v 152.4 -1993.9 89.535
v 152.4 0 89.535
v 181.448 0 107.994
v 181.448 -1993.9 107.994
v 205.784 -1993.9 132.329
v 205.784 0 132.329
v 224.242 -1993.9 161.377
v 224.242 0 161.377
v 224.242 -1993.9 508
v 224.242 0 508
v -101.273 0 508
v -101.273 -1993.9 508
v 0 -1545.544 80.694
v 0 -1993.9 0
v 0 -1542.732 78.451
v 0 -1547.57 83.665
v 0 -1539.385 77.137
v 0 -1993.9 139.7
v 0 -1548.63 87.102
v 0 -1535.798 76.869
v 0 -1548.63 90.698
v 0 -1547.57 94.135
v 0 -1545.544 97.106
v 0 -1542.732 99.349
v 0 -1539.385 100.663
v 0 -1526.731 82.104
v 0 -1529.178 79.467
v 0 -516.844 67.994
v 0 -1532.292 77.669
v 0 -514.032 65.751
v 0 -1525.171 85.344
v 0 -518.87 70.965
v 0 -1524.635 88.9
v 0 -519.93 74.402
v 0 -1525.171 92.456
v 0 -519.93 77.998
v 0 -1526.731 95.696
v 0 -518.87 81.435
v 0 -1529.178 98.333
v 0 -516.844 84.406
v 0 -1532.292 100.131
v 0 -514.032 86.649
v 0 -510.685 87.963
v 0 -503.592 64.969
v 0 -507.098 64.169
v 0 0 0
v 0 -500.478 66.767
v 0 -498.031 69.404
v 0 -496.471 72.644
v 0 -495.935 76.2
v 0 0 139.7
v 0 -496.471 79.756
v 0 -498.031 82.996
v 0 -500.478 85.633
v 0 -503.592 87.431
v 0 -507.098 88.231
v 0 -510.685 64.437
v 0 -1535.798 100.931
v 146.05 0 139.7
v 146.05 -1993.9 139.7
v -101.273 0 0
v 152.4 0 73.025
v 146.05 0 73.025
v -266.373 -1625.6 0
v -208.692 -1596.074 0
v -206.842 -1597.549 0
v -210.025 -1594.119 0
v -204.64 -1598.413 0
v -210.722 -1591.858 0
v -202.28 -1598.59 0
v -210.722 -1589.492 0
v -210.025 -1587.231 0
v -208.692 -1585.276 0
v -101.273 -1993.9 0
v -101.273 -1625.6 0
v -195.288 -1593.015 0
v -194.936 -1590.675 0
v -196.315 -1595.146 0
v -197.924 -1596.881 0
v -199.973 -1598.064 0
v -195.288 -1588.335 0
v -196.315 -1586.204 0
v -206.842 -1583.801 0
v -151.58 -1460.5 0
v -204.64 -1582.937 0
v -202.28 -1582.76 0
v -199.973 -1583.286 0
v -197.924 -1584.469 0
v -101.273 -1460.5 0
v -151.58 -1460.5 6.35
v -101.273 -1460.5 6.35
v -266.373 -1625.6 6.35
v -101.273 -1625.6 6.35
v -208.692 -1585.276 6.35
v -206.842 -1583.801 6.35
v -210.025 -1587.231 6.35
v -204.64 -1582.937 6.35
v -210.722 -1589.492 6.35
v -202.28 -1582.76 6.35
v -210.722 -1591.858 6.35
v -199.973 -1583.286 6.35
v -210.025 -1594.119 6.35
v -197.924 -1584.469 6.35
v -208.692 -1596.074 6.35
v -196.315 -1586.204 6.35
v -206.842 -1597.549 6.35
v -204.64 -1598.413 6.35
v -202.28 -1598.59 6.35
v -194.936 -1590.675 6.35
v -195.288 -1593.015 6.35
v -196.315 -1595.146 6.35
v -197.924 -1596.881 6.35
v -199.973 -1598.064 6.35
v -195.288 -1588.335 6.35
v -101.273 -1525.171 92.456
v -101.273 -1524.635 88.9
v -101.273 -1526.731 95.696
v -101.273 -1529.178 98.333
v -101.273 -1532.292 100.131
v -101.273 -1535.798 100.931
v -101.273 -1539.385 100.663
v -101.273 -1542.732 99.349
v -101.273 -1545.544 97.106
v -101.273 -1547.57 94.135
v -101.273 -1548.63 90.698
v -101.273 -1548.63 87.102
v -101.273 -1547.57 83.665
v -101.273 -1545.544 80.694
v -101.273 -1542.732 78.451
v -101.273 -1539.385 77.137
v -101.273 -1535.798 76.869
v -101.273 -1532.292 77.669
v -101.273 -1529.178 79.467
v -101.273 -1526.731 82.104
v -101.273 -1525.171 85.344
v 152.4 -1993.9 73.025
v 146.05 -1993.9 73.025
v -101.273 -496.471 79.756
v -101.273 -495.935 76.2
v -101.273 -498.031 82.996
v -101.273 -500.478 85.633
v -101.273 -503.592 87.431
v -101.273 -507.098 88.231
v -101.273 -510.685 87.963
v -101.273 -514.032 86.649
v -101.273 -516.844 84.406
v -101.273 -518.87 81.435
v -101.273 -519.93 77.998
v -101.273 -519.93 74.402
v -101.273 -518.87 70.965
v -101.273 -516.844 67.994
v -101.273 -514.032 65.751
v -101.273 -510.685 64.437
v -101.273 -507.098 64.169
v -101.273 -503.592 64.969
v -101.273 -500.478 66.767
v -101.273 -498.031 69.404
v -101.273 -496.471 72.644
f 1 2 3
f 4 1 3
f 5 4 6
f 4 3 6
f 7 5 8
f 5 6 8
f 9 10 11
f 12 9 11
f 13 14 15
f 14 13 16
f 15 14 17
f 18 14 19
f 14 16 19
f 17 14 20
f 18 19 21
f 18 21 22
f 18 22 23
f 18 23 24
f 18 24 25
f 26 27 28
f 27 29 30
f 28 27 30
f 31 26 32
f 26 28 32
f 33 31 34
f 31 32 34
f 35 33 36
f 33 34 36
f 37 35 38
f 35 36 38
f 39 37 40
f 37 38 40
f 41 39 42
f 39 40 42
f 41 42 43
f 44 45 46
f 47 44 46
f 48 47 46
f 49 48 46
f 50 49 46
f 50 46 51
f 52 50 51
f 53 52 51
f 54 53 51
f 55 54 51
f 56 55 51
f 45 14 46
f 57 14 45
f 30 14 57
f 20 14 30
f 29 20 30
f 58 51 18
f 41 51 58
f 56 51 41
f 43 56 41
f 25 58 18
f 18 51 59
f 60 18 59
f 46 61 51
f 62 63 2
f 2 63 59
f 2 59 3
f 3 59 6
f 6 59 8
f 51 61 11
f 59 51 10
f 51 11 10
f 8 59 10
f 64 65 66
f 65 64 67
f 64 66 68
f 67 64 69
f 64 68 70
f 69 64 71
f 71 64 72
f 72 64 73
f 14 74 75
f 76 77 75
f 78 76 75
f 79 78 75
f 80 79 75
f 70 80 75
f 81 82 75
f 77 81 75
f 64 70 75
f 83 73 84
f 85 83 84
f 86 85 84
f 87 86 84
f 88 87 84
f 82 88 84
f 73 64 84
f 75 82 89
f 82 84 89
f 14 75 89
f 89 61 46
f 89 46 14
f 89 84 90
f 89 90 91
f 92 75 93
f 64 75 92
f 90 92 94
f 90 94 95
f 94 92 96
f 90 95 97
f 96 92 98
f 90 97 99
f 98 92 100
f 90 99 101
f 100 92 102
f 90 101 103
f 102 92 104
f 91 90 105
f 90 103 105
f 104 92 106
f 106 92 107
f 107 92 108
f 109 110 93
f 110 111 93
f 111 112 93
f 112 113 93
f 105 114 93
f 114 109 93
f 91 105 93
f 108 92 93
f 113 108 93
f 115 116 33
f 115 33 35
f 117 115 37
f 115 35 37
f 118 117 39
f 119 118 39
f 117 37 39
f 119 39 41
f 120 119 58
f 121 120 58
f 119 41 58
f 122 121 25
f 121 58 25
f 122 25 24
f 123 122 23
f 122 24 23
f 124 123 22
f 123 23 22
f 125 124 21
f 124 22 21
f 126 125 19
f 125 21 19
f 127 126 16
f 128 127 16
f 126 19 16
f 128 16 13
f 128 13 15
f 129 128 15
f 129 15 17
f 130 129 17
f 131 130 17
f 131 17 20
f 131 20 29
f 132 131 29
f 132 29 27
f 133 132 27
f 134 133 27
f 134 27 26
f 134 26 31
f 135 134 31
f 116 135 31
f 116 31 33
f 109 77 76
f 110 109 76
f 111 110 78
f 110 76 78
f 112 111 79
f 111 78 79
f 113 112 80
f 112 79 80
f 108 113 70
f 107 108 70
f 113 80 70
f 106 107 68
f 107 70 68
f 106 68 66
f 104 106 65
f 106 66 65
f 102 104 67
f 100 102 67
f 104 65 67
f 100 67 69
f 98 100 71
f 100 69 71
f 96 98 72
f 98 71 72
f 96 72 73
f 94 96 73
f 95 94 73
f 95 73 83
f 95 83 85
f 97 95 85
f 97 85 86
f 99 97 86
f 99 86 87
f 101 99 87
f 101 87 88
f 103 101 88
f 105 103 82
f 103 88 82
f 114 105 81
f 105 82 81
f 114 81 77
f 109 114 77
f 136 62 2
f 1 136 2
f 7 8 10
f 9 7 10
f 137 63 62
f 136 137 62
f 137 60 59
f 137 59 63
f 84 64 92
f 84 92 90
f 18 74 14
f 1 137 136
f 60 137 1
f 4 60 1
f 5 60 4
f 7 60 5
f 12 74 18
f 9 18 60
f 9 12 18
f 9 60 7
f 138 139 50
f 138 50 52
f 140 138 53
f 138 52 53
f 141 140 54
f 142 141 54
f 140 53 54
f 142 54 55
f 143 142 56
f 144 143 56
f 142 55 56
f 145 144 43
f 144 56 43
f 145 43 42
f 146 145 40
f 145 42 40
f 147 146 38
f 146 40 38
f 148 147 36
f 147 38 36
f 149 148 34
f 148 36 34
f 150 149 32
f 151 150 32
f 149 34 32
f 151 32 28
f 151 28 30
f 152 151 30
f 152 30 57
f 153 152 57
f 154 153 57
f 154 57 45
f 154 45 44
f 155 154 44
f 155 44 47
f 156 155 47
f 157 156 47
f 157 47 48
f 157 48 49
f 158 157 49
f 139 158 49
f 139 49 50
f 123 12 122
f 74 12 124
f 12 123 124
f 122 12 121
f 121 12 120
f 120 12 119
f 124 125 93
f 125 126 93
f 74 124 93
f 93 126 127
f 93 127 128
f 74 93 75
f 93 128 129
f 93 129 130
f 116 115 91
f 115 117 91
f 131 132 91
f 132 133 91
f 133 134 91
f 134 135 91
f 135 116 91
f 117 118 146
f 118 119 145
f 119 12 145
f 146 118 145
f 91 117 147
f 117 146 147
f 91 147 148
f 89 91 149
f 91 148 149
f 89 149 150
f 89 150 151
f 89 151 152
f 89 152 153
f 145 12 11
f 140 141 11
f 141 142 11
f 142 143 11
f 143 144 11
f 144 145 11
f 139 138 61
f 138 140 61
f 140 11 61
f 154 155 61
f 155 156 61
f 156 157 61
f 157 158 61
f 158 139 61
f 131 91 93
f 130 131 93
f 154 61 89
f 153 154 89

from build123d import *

# Parameters (mm, degrees)
F1_DEPTH = 1993.9
F2_R     = 12.065
F3_DEPTH = 254
F4_R     = 7.9375
F5_DEPTH = 6.35


with BuildPart() as f1:
    # F0 (on Front) → F1 (new body)
    with BuildSketch(Plane.XZ):
        with BuildLine():
            Line((-101.273338, 0), (0, 0))
            Line((0, 0), (0, 139.7))
            Line((0, 139.7), (146.05, 139.7))
            Line((146.05, 139.7), (146.05, 73.025))
            Line((146.05, 73.025), (152.4, 73.025))
            Line((152.4, 73.025), (152.4, 89.535))
            ThreePointArc((152.4, 89.535), (194.283381, 119.493668), (224.242049, 161.377049))
            Line((224.242049, 161.377049), (224.242049, 508))
            Line((224.242049, 508), (-101.273338, 508))
            Line((-101.273338, 508), (-101.273338, 0))
        make_face()
    extrude(amount=F1_DEPTH)

    # F2 (on face) → F3 (cut)
    with BuildSketch(Plane.YZ):
        with Locations((-1536.7, 88.9)):
            Circle(F2_R)
        with Locations((-508, 76.2)):
            Circle(F2_R)
    extrude(amount=-F3_DEPTH, mode=Mode.SUBTRACT)

    # F4 (on face) → F5 (join)
    with BuildSketch(Plane(origin=(0, 0, 0), x_dir=(1, 0, 0), z_dir=(0, 0, -1))):
        Polygon((-101.273338, 1460.5), (-101.273338, 1625.6), (-266.373338, 1625.6), (-151.579931, 1460.5), align=None)
        with Locations((-202.873338, 1590.675)):
            Circle(F4_R, mode=Mode.SUBTRACT)
    extrude(amount=-F5_DEPTH)


solid = f1.part
